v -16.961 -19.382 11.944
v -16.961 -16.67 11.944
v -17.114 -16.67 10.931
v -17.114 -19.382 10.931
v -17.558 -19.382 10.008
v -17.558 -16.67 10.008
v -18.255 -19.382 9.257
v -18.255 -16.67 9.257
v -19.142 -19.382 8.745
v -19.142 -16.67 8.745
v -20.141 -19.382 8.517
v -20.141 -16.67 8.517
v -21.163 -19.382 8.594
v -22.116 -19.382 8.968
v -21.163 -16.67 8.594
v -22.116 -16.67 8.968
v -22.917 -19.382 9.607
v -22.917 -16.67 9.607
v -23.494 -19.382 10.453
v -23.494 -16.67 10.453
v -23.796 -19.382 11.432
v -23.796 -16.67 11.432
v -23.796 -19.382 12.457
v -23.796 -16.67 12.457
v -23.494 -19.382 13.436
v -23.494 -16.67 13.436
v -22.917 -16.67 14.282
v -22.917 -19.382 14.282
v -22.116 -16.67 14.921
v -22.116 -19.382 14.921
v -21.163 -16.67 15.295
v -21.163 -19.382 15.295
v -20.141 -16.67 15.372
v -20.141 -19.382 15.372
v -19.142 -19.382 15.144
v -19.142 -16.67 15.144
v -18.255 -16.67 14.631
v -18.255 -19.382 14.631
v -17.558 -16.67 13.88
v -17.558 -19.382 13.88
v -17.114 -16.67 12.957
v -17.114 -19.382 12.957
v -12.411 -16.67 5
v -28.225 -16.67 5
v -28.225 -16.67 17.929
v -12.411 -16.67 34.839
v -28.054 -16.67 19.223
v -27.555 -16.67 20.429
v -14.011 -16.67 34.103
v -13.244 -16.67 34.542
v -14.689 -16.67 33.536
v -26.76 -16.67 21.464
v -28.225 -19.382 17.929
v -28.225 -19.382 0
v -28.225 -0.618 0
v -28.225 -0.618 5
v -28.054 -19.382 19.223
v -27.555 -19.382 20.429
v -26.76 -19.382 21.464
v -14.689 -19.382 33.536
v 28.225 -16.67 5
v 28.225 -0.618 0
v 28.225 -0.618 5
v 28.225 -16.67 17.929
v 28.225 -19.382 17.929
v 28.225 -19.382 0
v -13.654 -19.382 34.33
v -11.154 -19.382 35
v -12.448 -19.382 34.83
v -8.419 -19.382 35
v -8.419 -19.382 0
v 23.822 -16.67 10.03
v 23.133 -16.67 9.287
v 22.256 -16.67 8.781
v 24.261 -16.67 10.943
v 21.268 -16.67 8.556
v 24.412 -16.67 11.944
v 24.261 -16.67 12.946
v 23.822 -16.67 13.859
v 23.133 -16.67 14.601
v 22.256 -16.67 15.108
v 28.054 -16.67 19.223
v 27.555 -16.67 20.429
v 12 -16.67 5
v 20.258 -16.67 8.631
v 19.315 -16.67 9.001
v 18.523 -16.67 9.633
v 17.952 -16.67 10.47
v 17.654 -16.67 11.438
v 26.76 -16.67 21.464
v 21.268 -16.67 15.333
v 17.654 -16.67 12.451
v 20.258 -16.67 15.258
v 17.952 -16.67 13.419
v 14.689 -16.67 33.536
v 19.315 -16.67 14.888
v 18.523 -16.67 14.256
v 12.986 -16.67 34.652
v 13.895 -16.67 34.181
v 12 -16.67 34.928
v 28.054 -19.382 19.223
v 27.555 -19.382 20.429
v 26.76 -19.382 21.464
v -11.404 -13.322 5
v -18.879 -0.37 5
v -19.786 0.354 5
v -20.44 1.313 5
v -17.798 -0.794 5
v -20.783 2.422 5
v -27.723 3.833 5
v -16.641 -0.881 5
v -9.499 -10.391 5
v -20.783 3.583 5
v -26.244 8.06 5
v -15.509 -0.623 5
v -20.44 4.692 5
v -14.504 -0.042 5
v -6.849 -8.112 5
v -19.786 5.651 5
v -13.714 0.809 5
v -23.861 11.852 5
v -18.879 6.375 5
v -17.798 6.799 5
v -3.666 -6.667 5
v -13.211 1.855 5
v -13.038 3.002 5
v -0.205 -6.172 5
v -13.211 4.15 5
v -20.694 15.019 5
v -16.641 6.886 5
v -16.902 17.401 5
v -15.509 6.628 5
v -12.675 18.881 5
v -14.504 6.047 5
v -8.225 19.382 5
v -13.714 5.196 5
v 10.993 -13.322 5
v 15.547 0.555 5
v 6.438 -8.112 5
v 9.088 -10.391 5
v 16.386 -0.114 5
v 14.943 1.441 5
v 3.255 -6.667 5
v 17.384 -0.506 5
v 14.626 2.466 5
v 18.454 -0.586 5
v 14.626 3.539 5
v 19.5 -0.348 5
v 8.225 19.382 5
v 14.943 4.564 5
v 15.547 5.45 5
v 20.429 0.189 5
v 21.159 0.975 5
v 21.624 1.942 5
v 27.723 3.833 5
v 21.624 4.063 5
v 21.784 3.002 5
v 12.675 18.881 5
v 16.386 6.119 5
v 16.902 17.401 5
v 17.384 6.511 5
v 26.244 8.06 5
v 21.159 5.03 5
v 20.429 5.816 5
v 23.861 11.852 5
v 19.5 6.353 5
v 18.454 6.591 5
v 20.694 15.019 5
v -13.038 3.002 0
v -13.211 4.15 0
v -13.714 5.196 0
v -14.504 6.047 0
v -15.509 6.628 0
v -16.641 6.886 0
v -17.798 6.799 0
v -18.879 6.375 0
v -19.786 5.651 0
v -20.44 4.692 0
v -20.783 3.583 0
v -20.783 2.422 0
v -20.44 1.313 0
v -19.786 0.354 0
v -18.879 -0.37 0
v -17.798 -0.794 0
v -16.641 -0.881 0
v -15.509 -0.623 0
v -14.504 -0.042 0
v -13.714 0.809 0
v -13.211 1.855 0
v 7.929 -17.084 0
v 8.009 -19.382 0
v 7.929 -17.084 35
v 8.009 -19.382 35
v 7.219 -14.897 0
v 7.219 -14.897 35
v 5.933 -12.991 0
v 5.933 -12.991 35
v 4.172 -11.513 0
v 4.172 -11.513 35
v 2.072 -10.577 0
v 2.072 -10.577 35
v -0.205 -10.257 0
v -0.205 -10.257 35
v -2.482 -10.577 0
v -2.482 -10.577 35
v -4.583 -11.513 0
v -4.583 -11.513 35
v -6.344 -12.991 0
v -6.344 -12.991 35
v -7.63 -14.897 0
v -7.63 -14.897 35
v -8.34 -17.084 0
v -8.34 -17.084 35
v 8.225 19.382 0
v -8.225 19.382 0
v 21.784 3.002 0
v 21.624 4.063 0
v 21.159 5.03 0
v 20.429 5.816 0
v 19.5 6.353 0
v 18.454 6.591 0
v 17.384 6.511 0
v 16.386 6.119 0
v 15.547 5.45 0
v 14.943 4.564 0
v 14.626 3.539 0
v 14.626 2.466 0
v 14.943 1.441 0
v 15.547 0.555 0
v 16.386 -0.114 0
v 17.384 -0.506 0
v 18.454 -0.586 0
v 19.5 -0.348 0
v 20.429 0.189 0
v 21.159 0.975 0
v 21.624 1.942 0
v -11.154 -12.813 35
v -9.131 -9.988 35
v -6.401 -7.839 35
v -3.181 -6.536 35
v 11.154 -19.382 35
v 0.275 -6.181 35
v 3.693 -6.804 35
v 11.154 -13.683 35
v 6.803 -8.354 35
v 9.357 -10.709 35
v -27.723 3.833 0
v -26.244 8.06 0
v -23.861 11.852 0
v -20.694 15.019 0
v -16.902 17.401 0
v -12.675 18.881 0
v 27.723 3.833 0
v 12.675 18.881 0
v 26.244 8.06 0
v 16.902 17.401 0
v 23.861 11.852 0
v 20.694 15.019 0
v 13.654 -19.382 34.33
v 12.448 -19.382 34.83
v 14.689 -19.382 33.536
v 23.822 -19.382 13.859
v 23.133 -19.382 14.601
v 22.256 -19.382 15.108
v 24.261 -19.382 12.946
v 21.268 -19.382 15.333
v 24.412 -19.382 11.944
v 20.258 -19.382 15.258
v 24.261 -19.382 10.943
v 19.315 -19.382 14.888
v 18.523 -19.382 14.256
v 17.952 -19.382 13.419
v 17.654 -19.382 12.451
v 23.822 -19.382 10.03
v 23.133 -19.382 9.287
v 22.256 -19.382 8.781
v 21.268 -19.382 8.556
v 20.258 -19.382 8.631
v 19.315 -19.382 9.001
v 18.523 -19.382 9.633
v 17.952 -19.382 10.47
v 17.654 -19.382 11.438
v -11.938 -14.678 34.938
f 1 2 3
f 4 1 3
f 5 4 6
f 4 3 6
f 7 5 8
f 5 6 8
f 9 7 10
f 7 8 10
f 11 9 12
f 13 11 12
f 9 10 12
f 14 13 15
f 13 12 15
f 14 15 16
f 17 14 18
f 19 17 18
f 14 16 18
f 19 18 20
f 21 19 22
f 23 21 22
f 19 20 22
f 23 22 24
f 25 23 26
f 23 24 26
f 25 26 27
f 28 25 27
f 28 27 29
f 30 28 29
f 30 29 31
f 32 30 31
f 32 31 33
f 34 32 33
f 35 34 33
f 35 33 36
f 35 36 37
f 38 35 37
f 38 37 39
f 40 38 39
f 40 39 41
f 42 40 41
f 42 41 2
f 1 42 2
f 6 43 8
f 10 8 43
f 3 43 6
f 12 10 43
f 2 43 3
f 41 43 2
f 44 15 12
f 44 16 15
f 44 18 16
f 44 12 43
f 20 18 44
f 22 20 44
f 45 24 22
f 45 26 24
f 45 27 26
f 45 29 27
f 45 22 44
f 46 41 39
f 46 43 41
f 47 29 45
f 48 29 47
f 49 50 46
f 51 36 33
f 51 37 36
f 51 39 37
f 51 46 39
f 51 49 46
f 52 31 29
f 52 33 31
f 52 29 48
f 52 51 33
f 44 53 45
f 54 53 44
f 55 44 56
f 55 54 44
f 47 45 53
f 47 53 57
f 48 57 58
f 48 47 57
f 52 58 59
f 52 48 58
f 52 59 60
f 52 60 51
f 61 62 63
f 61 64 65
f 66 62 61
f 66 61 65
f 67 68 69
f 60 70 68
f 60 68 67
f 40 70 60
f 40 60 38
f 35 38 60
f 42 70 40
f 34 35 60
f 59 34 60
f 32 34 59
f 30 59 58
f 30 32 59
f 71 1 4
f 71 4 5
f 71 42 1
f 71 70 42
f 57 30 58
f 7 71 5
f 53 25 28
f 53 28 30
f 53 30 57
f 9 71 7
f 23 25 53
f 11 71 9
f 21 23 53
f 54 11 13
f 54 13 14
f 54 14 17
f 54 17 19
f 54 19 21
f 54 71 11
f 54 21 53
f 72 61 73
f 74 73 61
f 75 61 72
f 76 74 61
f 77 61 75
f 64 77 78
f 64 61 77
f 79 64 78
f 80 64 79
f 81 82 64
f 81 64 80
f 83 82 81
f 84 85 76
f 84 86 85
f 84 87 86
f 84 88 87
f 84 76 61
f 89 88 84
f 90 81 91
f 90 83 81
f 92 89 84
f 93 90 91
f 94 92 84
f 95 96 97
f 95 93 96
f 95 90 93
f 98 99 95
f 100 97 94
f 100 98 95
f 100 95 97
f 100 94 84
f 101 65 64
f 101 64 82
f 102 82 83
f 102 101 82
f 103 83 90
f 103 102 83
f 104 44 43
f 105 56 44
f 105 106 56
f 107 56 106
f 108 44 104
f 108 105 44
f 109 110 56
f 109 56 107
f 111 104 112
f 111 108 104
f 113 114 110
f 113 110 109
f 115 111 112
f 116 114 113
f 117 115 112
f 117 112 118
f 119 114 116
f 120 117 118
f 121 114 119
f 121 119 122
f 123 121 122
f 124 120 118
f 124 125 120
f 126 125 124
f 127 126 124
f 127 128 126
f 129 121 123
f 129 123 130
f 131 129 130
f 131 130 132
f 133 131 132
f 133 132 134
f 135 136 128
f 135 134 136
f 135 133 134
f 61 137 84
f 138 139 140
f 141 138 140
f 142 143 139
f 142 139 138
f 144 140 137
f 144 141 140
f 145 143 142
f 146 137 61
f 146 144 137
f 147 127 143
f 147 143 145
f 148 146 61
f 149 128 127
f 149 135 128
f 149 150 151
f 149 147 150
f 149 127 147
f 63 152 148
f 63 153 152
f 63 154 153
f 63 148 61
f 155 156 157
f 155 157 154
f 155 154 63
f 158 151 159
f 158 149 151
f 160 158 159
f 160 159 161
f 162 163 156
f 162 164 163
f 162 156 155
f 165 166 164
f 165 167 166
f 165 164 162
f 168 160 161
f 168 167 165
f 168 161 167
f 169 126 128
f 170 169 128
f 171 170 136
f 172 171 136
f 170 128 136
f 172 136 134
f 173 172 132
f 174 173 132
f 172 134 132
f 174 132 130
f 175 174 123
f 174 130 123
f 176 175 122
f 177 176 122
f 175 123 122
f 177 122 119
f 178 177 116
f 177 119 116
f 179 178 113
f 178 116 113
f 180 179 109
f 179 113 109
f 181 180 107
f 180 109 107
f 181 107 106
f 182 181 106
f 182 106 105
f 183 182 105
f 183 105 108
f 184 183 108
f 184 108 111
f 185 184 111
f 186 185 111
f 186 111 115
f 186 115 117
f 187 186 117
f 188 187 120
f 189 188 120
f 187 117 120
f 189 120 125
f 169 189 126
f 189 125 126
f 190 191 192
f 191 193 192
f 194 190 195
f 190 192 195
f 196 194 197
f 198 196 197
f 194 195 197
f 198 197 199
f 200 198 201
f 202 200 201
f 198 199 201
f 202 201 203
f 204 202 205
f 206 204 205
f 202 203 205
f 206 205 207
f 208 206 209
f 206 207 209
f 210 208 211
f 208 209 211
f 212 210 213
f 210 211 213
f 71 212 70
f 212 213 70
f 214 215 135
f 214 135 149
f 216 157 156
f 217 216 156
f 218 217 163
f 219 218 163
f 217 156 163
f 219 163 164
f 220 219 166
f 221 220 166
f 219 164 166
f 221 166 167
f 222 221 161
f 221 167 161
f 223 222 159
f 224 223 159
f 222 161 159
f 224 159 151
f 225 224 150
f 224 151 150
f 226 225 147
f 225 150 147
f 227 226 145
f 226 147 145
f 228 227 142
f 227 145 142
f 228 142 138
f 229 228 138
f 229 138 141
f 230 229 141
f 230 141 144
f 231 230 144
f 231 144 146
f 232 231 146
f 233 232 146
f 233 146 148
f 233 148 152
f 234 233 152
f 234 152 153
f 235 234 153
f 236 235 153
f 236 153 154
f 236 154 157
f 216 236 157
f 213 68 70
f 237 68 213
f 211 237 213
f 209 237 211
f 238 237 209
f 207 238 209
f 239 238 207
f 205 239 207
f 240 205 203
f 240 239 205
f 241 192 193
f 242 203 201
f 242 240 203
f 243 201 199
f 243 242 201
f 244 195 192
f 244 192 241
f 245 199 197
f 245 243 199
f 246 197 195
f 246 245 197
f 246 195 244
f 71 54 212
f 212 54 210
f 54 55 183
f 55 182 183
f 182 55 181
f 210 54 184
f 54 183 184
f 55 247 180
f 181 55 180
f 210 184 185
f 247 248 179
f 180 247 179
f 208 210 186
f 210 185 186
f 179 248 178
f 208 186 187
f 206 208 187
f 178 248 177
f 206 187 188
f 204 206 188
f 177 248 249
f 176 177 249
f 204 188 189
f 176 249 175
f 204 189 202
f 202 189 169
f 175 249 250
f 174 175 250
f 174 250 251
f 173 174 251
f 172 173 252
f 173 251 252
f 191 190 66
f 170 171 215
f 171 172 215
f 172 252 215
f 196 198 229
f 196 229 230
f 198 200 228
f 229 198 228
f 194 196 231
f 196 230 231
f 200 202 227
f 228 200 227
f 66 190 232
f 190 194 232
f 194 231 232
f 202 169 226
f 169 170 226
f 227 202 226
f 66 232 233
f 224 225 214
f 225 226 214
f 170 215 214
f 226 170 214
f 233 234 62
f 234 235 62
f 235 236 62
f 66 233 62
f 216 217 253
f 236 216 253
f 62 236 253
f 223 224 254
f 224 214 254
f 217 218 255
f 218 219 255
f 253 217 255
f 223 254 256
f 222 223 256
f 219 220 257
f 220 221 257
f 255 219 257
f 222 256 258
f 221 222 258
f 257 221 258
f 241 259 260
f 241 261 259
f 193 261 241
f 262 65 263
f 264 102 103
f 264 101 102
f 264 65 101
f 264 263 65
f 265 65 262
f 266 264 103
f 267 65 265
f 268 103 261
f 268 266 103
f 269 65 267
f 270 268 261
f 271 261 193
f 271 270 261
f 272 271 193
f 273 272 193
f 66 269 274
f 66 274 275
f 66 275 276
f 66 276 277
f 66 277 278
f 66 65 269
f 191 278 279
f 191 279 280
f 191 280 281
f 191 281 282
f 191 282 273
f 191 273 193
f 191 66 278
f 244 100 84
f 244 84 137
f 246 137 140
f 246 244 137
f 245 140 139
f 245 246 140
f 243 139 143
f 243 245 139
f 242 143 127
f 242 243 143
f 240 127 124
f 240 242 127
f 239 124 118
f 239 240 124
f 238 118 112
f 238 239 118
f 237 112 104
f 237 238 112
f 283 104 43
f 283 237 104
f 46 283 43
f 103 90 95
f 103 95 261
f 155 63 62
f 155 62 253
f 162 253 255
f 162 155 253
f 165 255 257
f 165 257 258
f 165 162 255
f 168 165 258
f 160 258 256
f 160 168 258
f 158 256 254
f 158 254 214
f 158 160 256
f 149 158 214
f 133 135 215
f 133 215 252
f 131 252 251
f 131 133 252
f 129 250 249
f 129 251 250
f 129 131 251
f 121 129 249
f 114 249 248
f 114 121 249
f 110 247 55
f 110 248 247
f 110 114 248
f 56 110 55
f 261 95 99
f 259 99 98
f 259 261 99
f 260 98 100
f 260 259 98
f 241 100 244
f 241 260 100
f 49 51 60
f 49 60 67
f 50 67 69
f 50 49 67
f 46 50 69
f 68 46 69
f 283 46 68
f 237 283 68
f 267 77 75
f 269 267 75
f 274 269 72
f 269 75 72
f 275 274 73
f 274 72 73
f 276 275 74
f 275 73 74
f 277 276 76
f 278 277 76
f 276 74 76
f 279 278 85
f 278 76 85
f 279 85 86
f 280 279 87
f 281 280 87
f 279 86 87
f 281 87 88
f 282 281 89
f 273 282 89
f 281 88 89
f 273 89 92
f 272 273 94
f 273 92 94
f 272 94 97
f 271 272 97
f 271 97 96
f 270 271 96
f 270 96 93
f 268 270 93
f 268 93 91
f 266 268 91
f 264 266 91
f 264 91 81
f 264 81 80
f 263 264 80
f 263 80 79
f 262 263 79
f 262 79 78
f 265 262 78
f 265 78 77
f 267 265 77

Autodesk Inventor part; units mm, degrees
ref_plane "YZ Plane" through (0, 0, 0) normal (1, 0, 0) x (0, 1, 0)
ref_plane "XZ Plane" through (0, 0, 0) normal (0, 1, 0) x (-1, 0, 0)
ref_plane "XY Plane" through (0, 0, 0) normal (0, 0, 1) x (1, 0, 0)
sketch "스케치1" plane through (0, 0, 0) normal (0, 0, 1) x (1, 0, 0)
  line L0 (28.2247, -19.3821) -> (-28.2247, -19.3821)
  line L1 (-28.2247, -19.3821) -> (-28.2247, 19.3821)
  line L2 (-28.2247, 19.3821) -> (28.2247, 19.3821)
  line L3 (28.2247, 19.3821) -> (28.2247, -19.3821)
  line L4 (28.2247, -19.3821) -> (-28.2247, 19.3821) construction
  line L5 (-28.2247, -19.3821) -> (28.2247, 19.3821) construction
  point P0 (0, 0)
extrude "돌출1" add sketch "스케치1" along normal blind 35
sketch "스케치2" plane through (0, 0, 35) normal (0, 0, 1) x (1, 0, 0)
  line L0 (-28.2247, -19.3821) -> (28.2247, -19.3821) projected
  arc A0 (8.0086, -19.3821) -> (-8.4193, -19.3821) centre (-0.2053, -18.5165) ccw
  arc A1 (12.0005, -16.6695) -> (-12.4112, -16.6695) centre (-0.2053, -18.5165) ccw
  line L1 (28.2247, -19.3821) -> (28.2247, 19.3821) projected
  line L2 (28.2247, -16.6695) -> (12.0005, -16.6695)
  line L3 (-12.4112, -16.6695) -> (-28.2247, -16.6695)
  line L4 (28.2247, -16.6695) -> (28.2247, 19.3821)
  line L5 (28.2247, 19.3821) -> (-28.2247, 19.3821) projected
  line L6 (-28.2247, 19.3821) -> (-28.2247, -16.6695)
  point P0 (0, 0)
extrude "돌출2" cut sketch "스케치2" against normal blind 30 contours L2 A1 L3 L6 L5 L1
extrude "돌출3" cut sketch "스케치2" against normal blind 35 contours A0 L0
sketch "스케치3" plane through (-28.2247, -16.6695, 35) normal (0, 1, 0) x (1, 0, 0)
  circle A0 centre (7.8268, 23.0556) radius 3.4368
  circle A1 centre (49.2387, 23.0556) radius 3.3984
  point P0 (28.2247, 35)
extrude "돌출4" cut sketch "스케치3" against normal blind 35
chamfer "모따기1" distance 15 angle 45 1 edges at (-28.2247, -18.0258, 35)
chamfer "모따기2" distance 15 angle 45 1 edges at (28.2247, -18.0258, 35)
fillet "모깎기1" radius 5 4 edges at (28.2247, -18.0258, 20) (13.2247, -18.0258, 35) (-13.2247, -18.0258, 35) (-28.2247, -18.0258, 20)
sketch "스케치4" plane through (0, 0, 5) normal (0, 0, 1) x (1, 0, 0)
  circle A0 centre (18.185, 3.0025) radius 3.5989
  circle A1 centre (-16.9318, 3.0025) radius 3.8942
  line L0 (-28.2247, 19.3821) -> (28.2247, 19.3821) projected
  arc A2 (-10.8118, 19.3821) -> (-28.2247, -16.6695) centre (16.7776, -16.1746) ccw
  line L1 (28.2247, 19.3821) -> (28.2247, -19.3821) projected
  arc A3 (28.2247, -16.6695) -> (8.7119, 19.3821) centre (-7.9765, -12.9568) ccw
  line L2 (-28.2247, -16.6695) -> (-28.2247, 19.3821) projected
  line L3 (-28.2247, -16.6695) -> (-28.2247, 19.3821)
  line L4 (-28.2247, 19.3821) -> (-10.8118, 19.3821)
  line L5 (8.7119, 19.3821) -> (28.2247, 19.3821)
  point P0 (0, 0)
extrude "돌출5" cut sketch "스케치4" against normal blind 35 contours A0 | A1
sketch "스케치5" plane through (0, 0, 0) normal (0, 0, -1) x (-1, 0, 0)
  point P0 (0, 0)
fillet "모깎기2" radius 20 2 edges at (28.2247, 19.3821, 2.5) (-28.2247, 19.3821, 2.5)
properties part number "240516_3Dsketch02"
